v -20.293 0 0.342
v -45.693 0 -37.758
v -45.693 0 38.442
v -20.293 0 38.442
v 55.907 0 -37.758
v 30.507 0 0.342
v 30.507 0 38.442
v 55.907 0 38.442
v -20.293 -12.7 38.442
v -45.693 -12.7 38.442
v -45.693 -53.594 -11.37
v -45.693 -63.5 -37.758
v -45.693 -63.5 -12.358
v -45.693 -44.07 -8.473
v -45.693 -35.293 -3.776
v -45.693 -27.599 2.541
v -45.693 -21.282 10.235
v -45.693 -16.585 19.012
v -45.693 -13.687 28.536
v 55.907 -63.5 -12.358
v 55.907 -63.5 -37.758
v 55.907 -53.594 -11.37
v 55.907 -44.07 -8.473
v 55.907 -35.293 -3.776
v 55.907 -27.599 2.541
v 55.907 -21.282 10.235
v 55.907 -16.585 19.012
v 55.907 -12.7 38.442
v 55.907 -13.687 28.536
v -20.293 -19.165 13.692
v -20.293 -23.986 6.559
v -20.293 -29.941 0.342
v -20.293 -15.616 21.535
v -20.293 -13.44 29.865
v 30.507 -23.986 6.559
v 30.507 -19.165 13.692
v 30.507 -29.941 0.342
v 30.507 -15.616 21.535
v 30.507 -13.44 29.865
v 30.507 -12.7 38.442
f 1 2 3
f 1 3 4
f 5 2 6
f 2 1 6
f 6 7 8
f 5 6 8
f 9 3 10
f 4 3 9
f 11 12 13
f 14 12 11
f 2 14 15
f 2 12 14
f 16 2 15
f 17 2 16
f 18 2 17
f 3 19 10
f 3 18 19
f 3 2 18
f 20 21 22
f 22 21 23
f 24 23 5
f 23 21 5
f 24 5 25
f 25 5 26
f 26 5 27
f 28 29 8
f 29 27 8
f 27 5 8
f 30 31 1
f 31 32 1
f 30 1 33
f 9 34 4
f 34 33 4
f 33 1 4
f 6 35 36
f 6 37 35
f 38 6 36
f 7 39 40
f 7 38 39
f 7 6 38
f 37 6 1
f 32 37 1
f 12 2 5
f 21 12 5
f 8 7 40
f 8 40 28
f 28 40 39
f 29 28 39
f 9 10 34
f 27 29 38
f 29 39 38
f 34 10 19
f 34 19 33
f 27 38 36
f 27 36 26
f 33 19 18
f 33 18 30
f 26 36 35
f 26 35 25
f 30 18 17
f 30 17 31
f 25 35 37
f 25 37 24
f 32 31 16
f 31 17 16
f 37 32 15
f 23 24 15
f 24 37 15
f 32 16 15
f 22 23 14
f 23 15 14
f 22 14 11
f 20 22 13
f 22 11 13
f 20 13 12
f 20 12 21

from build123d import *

# Parameters (mm, degrees)
F0_W     = 101.6
F0_H     = 76.2
F1_DEPTH = 63.5
F3_DEPTH = 127
F4_W     = 50.8
F4_H     = 38.1
F5_DEPTH = 57.15


with BuildPart() as f1:
    # F0 (on Front) → F1 (new body)
    with BuildSketch(Plane.XZ):
        with Locations((5.107021, 0.342115)):
            Rectangle(F0_W, F0_H)
    extrude(amount=F1_DEPTH)

    # F2 (on face) → F3 (cut)
    with BuildSketch(Plane(origin=(-45.692979, 0, 0), x_dir=(0, -1, 0), z_dir=(-1, 0, 0))):
        with BuildLine():
            ThreePointArc((12.7, 38.442115), (27.598959, 2.541074), (63.5, -12.357885))
            Line((63.5, -12.357885), (63.5, 38.442115))
            Line((63.5, 38.442115), (12.7, 38.442115))
        make_face()
    extrude(amount=-F3_DEPTH, mode=Mode.SUBTRACT)

    # F4 (on face) → F5 (cut)
    with BuildSketch(Plane(origin=(0, 0, 0), x_dir=(-1, 0, 0), z_dir=(0, 1, 0))):
        with Locations((-5.107021, 19.392115)):
            Rectangle(F4_W, F4_H)
    extrude(amount=-F5_DEPTH, mode=Mode.SUBTRACT)


solid = f1.part
